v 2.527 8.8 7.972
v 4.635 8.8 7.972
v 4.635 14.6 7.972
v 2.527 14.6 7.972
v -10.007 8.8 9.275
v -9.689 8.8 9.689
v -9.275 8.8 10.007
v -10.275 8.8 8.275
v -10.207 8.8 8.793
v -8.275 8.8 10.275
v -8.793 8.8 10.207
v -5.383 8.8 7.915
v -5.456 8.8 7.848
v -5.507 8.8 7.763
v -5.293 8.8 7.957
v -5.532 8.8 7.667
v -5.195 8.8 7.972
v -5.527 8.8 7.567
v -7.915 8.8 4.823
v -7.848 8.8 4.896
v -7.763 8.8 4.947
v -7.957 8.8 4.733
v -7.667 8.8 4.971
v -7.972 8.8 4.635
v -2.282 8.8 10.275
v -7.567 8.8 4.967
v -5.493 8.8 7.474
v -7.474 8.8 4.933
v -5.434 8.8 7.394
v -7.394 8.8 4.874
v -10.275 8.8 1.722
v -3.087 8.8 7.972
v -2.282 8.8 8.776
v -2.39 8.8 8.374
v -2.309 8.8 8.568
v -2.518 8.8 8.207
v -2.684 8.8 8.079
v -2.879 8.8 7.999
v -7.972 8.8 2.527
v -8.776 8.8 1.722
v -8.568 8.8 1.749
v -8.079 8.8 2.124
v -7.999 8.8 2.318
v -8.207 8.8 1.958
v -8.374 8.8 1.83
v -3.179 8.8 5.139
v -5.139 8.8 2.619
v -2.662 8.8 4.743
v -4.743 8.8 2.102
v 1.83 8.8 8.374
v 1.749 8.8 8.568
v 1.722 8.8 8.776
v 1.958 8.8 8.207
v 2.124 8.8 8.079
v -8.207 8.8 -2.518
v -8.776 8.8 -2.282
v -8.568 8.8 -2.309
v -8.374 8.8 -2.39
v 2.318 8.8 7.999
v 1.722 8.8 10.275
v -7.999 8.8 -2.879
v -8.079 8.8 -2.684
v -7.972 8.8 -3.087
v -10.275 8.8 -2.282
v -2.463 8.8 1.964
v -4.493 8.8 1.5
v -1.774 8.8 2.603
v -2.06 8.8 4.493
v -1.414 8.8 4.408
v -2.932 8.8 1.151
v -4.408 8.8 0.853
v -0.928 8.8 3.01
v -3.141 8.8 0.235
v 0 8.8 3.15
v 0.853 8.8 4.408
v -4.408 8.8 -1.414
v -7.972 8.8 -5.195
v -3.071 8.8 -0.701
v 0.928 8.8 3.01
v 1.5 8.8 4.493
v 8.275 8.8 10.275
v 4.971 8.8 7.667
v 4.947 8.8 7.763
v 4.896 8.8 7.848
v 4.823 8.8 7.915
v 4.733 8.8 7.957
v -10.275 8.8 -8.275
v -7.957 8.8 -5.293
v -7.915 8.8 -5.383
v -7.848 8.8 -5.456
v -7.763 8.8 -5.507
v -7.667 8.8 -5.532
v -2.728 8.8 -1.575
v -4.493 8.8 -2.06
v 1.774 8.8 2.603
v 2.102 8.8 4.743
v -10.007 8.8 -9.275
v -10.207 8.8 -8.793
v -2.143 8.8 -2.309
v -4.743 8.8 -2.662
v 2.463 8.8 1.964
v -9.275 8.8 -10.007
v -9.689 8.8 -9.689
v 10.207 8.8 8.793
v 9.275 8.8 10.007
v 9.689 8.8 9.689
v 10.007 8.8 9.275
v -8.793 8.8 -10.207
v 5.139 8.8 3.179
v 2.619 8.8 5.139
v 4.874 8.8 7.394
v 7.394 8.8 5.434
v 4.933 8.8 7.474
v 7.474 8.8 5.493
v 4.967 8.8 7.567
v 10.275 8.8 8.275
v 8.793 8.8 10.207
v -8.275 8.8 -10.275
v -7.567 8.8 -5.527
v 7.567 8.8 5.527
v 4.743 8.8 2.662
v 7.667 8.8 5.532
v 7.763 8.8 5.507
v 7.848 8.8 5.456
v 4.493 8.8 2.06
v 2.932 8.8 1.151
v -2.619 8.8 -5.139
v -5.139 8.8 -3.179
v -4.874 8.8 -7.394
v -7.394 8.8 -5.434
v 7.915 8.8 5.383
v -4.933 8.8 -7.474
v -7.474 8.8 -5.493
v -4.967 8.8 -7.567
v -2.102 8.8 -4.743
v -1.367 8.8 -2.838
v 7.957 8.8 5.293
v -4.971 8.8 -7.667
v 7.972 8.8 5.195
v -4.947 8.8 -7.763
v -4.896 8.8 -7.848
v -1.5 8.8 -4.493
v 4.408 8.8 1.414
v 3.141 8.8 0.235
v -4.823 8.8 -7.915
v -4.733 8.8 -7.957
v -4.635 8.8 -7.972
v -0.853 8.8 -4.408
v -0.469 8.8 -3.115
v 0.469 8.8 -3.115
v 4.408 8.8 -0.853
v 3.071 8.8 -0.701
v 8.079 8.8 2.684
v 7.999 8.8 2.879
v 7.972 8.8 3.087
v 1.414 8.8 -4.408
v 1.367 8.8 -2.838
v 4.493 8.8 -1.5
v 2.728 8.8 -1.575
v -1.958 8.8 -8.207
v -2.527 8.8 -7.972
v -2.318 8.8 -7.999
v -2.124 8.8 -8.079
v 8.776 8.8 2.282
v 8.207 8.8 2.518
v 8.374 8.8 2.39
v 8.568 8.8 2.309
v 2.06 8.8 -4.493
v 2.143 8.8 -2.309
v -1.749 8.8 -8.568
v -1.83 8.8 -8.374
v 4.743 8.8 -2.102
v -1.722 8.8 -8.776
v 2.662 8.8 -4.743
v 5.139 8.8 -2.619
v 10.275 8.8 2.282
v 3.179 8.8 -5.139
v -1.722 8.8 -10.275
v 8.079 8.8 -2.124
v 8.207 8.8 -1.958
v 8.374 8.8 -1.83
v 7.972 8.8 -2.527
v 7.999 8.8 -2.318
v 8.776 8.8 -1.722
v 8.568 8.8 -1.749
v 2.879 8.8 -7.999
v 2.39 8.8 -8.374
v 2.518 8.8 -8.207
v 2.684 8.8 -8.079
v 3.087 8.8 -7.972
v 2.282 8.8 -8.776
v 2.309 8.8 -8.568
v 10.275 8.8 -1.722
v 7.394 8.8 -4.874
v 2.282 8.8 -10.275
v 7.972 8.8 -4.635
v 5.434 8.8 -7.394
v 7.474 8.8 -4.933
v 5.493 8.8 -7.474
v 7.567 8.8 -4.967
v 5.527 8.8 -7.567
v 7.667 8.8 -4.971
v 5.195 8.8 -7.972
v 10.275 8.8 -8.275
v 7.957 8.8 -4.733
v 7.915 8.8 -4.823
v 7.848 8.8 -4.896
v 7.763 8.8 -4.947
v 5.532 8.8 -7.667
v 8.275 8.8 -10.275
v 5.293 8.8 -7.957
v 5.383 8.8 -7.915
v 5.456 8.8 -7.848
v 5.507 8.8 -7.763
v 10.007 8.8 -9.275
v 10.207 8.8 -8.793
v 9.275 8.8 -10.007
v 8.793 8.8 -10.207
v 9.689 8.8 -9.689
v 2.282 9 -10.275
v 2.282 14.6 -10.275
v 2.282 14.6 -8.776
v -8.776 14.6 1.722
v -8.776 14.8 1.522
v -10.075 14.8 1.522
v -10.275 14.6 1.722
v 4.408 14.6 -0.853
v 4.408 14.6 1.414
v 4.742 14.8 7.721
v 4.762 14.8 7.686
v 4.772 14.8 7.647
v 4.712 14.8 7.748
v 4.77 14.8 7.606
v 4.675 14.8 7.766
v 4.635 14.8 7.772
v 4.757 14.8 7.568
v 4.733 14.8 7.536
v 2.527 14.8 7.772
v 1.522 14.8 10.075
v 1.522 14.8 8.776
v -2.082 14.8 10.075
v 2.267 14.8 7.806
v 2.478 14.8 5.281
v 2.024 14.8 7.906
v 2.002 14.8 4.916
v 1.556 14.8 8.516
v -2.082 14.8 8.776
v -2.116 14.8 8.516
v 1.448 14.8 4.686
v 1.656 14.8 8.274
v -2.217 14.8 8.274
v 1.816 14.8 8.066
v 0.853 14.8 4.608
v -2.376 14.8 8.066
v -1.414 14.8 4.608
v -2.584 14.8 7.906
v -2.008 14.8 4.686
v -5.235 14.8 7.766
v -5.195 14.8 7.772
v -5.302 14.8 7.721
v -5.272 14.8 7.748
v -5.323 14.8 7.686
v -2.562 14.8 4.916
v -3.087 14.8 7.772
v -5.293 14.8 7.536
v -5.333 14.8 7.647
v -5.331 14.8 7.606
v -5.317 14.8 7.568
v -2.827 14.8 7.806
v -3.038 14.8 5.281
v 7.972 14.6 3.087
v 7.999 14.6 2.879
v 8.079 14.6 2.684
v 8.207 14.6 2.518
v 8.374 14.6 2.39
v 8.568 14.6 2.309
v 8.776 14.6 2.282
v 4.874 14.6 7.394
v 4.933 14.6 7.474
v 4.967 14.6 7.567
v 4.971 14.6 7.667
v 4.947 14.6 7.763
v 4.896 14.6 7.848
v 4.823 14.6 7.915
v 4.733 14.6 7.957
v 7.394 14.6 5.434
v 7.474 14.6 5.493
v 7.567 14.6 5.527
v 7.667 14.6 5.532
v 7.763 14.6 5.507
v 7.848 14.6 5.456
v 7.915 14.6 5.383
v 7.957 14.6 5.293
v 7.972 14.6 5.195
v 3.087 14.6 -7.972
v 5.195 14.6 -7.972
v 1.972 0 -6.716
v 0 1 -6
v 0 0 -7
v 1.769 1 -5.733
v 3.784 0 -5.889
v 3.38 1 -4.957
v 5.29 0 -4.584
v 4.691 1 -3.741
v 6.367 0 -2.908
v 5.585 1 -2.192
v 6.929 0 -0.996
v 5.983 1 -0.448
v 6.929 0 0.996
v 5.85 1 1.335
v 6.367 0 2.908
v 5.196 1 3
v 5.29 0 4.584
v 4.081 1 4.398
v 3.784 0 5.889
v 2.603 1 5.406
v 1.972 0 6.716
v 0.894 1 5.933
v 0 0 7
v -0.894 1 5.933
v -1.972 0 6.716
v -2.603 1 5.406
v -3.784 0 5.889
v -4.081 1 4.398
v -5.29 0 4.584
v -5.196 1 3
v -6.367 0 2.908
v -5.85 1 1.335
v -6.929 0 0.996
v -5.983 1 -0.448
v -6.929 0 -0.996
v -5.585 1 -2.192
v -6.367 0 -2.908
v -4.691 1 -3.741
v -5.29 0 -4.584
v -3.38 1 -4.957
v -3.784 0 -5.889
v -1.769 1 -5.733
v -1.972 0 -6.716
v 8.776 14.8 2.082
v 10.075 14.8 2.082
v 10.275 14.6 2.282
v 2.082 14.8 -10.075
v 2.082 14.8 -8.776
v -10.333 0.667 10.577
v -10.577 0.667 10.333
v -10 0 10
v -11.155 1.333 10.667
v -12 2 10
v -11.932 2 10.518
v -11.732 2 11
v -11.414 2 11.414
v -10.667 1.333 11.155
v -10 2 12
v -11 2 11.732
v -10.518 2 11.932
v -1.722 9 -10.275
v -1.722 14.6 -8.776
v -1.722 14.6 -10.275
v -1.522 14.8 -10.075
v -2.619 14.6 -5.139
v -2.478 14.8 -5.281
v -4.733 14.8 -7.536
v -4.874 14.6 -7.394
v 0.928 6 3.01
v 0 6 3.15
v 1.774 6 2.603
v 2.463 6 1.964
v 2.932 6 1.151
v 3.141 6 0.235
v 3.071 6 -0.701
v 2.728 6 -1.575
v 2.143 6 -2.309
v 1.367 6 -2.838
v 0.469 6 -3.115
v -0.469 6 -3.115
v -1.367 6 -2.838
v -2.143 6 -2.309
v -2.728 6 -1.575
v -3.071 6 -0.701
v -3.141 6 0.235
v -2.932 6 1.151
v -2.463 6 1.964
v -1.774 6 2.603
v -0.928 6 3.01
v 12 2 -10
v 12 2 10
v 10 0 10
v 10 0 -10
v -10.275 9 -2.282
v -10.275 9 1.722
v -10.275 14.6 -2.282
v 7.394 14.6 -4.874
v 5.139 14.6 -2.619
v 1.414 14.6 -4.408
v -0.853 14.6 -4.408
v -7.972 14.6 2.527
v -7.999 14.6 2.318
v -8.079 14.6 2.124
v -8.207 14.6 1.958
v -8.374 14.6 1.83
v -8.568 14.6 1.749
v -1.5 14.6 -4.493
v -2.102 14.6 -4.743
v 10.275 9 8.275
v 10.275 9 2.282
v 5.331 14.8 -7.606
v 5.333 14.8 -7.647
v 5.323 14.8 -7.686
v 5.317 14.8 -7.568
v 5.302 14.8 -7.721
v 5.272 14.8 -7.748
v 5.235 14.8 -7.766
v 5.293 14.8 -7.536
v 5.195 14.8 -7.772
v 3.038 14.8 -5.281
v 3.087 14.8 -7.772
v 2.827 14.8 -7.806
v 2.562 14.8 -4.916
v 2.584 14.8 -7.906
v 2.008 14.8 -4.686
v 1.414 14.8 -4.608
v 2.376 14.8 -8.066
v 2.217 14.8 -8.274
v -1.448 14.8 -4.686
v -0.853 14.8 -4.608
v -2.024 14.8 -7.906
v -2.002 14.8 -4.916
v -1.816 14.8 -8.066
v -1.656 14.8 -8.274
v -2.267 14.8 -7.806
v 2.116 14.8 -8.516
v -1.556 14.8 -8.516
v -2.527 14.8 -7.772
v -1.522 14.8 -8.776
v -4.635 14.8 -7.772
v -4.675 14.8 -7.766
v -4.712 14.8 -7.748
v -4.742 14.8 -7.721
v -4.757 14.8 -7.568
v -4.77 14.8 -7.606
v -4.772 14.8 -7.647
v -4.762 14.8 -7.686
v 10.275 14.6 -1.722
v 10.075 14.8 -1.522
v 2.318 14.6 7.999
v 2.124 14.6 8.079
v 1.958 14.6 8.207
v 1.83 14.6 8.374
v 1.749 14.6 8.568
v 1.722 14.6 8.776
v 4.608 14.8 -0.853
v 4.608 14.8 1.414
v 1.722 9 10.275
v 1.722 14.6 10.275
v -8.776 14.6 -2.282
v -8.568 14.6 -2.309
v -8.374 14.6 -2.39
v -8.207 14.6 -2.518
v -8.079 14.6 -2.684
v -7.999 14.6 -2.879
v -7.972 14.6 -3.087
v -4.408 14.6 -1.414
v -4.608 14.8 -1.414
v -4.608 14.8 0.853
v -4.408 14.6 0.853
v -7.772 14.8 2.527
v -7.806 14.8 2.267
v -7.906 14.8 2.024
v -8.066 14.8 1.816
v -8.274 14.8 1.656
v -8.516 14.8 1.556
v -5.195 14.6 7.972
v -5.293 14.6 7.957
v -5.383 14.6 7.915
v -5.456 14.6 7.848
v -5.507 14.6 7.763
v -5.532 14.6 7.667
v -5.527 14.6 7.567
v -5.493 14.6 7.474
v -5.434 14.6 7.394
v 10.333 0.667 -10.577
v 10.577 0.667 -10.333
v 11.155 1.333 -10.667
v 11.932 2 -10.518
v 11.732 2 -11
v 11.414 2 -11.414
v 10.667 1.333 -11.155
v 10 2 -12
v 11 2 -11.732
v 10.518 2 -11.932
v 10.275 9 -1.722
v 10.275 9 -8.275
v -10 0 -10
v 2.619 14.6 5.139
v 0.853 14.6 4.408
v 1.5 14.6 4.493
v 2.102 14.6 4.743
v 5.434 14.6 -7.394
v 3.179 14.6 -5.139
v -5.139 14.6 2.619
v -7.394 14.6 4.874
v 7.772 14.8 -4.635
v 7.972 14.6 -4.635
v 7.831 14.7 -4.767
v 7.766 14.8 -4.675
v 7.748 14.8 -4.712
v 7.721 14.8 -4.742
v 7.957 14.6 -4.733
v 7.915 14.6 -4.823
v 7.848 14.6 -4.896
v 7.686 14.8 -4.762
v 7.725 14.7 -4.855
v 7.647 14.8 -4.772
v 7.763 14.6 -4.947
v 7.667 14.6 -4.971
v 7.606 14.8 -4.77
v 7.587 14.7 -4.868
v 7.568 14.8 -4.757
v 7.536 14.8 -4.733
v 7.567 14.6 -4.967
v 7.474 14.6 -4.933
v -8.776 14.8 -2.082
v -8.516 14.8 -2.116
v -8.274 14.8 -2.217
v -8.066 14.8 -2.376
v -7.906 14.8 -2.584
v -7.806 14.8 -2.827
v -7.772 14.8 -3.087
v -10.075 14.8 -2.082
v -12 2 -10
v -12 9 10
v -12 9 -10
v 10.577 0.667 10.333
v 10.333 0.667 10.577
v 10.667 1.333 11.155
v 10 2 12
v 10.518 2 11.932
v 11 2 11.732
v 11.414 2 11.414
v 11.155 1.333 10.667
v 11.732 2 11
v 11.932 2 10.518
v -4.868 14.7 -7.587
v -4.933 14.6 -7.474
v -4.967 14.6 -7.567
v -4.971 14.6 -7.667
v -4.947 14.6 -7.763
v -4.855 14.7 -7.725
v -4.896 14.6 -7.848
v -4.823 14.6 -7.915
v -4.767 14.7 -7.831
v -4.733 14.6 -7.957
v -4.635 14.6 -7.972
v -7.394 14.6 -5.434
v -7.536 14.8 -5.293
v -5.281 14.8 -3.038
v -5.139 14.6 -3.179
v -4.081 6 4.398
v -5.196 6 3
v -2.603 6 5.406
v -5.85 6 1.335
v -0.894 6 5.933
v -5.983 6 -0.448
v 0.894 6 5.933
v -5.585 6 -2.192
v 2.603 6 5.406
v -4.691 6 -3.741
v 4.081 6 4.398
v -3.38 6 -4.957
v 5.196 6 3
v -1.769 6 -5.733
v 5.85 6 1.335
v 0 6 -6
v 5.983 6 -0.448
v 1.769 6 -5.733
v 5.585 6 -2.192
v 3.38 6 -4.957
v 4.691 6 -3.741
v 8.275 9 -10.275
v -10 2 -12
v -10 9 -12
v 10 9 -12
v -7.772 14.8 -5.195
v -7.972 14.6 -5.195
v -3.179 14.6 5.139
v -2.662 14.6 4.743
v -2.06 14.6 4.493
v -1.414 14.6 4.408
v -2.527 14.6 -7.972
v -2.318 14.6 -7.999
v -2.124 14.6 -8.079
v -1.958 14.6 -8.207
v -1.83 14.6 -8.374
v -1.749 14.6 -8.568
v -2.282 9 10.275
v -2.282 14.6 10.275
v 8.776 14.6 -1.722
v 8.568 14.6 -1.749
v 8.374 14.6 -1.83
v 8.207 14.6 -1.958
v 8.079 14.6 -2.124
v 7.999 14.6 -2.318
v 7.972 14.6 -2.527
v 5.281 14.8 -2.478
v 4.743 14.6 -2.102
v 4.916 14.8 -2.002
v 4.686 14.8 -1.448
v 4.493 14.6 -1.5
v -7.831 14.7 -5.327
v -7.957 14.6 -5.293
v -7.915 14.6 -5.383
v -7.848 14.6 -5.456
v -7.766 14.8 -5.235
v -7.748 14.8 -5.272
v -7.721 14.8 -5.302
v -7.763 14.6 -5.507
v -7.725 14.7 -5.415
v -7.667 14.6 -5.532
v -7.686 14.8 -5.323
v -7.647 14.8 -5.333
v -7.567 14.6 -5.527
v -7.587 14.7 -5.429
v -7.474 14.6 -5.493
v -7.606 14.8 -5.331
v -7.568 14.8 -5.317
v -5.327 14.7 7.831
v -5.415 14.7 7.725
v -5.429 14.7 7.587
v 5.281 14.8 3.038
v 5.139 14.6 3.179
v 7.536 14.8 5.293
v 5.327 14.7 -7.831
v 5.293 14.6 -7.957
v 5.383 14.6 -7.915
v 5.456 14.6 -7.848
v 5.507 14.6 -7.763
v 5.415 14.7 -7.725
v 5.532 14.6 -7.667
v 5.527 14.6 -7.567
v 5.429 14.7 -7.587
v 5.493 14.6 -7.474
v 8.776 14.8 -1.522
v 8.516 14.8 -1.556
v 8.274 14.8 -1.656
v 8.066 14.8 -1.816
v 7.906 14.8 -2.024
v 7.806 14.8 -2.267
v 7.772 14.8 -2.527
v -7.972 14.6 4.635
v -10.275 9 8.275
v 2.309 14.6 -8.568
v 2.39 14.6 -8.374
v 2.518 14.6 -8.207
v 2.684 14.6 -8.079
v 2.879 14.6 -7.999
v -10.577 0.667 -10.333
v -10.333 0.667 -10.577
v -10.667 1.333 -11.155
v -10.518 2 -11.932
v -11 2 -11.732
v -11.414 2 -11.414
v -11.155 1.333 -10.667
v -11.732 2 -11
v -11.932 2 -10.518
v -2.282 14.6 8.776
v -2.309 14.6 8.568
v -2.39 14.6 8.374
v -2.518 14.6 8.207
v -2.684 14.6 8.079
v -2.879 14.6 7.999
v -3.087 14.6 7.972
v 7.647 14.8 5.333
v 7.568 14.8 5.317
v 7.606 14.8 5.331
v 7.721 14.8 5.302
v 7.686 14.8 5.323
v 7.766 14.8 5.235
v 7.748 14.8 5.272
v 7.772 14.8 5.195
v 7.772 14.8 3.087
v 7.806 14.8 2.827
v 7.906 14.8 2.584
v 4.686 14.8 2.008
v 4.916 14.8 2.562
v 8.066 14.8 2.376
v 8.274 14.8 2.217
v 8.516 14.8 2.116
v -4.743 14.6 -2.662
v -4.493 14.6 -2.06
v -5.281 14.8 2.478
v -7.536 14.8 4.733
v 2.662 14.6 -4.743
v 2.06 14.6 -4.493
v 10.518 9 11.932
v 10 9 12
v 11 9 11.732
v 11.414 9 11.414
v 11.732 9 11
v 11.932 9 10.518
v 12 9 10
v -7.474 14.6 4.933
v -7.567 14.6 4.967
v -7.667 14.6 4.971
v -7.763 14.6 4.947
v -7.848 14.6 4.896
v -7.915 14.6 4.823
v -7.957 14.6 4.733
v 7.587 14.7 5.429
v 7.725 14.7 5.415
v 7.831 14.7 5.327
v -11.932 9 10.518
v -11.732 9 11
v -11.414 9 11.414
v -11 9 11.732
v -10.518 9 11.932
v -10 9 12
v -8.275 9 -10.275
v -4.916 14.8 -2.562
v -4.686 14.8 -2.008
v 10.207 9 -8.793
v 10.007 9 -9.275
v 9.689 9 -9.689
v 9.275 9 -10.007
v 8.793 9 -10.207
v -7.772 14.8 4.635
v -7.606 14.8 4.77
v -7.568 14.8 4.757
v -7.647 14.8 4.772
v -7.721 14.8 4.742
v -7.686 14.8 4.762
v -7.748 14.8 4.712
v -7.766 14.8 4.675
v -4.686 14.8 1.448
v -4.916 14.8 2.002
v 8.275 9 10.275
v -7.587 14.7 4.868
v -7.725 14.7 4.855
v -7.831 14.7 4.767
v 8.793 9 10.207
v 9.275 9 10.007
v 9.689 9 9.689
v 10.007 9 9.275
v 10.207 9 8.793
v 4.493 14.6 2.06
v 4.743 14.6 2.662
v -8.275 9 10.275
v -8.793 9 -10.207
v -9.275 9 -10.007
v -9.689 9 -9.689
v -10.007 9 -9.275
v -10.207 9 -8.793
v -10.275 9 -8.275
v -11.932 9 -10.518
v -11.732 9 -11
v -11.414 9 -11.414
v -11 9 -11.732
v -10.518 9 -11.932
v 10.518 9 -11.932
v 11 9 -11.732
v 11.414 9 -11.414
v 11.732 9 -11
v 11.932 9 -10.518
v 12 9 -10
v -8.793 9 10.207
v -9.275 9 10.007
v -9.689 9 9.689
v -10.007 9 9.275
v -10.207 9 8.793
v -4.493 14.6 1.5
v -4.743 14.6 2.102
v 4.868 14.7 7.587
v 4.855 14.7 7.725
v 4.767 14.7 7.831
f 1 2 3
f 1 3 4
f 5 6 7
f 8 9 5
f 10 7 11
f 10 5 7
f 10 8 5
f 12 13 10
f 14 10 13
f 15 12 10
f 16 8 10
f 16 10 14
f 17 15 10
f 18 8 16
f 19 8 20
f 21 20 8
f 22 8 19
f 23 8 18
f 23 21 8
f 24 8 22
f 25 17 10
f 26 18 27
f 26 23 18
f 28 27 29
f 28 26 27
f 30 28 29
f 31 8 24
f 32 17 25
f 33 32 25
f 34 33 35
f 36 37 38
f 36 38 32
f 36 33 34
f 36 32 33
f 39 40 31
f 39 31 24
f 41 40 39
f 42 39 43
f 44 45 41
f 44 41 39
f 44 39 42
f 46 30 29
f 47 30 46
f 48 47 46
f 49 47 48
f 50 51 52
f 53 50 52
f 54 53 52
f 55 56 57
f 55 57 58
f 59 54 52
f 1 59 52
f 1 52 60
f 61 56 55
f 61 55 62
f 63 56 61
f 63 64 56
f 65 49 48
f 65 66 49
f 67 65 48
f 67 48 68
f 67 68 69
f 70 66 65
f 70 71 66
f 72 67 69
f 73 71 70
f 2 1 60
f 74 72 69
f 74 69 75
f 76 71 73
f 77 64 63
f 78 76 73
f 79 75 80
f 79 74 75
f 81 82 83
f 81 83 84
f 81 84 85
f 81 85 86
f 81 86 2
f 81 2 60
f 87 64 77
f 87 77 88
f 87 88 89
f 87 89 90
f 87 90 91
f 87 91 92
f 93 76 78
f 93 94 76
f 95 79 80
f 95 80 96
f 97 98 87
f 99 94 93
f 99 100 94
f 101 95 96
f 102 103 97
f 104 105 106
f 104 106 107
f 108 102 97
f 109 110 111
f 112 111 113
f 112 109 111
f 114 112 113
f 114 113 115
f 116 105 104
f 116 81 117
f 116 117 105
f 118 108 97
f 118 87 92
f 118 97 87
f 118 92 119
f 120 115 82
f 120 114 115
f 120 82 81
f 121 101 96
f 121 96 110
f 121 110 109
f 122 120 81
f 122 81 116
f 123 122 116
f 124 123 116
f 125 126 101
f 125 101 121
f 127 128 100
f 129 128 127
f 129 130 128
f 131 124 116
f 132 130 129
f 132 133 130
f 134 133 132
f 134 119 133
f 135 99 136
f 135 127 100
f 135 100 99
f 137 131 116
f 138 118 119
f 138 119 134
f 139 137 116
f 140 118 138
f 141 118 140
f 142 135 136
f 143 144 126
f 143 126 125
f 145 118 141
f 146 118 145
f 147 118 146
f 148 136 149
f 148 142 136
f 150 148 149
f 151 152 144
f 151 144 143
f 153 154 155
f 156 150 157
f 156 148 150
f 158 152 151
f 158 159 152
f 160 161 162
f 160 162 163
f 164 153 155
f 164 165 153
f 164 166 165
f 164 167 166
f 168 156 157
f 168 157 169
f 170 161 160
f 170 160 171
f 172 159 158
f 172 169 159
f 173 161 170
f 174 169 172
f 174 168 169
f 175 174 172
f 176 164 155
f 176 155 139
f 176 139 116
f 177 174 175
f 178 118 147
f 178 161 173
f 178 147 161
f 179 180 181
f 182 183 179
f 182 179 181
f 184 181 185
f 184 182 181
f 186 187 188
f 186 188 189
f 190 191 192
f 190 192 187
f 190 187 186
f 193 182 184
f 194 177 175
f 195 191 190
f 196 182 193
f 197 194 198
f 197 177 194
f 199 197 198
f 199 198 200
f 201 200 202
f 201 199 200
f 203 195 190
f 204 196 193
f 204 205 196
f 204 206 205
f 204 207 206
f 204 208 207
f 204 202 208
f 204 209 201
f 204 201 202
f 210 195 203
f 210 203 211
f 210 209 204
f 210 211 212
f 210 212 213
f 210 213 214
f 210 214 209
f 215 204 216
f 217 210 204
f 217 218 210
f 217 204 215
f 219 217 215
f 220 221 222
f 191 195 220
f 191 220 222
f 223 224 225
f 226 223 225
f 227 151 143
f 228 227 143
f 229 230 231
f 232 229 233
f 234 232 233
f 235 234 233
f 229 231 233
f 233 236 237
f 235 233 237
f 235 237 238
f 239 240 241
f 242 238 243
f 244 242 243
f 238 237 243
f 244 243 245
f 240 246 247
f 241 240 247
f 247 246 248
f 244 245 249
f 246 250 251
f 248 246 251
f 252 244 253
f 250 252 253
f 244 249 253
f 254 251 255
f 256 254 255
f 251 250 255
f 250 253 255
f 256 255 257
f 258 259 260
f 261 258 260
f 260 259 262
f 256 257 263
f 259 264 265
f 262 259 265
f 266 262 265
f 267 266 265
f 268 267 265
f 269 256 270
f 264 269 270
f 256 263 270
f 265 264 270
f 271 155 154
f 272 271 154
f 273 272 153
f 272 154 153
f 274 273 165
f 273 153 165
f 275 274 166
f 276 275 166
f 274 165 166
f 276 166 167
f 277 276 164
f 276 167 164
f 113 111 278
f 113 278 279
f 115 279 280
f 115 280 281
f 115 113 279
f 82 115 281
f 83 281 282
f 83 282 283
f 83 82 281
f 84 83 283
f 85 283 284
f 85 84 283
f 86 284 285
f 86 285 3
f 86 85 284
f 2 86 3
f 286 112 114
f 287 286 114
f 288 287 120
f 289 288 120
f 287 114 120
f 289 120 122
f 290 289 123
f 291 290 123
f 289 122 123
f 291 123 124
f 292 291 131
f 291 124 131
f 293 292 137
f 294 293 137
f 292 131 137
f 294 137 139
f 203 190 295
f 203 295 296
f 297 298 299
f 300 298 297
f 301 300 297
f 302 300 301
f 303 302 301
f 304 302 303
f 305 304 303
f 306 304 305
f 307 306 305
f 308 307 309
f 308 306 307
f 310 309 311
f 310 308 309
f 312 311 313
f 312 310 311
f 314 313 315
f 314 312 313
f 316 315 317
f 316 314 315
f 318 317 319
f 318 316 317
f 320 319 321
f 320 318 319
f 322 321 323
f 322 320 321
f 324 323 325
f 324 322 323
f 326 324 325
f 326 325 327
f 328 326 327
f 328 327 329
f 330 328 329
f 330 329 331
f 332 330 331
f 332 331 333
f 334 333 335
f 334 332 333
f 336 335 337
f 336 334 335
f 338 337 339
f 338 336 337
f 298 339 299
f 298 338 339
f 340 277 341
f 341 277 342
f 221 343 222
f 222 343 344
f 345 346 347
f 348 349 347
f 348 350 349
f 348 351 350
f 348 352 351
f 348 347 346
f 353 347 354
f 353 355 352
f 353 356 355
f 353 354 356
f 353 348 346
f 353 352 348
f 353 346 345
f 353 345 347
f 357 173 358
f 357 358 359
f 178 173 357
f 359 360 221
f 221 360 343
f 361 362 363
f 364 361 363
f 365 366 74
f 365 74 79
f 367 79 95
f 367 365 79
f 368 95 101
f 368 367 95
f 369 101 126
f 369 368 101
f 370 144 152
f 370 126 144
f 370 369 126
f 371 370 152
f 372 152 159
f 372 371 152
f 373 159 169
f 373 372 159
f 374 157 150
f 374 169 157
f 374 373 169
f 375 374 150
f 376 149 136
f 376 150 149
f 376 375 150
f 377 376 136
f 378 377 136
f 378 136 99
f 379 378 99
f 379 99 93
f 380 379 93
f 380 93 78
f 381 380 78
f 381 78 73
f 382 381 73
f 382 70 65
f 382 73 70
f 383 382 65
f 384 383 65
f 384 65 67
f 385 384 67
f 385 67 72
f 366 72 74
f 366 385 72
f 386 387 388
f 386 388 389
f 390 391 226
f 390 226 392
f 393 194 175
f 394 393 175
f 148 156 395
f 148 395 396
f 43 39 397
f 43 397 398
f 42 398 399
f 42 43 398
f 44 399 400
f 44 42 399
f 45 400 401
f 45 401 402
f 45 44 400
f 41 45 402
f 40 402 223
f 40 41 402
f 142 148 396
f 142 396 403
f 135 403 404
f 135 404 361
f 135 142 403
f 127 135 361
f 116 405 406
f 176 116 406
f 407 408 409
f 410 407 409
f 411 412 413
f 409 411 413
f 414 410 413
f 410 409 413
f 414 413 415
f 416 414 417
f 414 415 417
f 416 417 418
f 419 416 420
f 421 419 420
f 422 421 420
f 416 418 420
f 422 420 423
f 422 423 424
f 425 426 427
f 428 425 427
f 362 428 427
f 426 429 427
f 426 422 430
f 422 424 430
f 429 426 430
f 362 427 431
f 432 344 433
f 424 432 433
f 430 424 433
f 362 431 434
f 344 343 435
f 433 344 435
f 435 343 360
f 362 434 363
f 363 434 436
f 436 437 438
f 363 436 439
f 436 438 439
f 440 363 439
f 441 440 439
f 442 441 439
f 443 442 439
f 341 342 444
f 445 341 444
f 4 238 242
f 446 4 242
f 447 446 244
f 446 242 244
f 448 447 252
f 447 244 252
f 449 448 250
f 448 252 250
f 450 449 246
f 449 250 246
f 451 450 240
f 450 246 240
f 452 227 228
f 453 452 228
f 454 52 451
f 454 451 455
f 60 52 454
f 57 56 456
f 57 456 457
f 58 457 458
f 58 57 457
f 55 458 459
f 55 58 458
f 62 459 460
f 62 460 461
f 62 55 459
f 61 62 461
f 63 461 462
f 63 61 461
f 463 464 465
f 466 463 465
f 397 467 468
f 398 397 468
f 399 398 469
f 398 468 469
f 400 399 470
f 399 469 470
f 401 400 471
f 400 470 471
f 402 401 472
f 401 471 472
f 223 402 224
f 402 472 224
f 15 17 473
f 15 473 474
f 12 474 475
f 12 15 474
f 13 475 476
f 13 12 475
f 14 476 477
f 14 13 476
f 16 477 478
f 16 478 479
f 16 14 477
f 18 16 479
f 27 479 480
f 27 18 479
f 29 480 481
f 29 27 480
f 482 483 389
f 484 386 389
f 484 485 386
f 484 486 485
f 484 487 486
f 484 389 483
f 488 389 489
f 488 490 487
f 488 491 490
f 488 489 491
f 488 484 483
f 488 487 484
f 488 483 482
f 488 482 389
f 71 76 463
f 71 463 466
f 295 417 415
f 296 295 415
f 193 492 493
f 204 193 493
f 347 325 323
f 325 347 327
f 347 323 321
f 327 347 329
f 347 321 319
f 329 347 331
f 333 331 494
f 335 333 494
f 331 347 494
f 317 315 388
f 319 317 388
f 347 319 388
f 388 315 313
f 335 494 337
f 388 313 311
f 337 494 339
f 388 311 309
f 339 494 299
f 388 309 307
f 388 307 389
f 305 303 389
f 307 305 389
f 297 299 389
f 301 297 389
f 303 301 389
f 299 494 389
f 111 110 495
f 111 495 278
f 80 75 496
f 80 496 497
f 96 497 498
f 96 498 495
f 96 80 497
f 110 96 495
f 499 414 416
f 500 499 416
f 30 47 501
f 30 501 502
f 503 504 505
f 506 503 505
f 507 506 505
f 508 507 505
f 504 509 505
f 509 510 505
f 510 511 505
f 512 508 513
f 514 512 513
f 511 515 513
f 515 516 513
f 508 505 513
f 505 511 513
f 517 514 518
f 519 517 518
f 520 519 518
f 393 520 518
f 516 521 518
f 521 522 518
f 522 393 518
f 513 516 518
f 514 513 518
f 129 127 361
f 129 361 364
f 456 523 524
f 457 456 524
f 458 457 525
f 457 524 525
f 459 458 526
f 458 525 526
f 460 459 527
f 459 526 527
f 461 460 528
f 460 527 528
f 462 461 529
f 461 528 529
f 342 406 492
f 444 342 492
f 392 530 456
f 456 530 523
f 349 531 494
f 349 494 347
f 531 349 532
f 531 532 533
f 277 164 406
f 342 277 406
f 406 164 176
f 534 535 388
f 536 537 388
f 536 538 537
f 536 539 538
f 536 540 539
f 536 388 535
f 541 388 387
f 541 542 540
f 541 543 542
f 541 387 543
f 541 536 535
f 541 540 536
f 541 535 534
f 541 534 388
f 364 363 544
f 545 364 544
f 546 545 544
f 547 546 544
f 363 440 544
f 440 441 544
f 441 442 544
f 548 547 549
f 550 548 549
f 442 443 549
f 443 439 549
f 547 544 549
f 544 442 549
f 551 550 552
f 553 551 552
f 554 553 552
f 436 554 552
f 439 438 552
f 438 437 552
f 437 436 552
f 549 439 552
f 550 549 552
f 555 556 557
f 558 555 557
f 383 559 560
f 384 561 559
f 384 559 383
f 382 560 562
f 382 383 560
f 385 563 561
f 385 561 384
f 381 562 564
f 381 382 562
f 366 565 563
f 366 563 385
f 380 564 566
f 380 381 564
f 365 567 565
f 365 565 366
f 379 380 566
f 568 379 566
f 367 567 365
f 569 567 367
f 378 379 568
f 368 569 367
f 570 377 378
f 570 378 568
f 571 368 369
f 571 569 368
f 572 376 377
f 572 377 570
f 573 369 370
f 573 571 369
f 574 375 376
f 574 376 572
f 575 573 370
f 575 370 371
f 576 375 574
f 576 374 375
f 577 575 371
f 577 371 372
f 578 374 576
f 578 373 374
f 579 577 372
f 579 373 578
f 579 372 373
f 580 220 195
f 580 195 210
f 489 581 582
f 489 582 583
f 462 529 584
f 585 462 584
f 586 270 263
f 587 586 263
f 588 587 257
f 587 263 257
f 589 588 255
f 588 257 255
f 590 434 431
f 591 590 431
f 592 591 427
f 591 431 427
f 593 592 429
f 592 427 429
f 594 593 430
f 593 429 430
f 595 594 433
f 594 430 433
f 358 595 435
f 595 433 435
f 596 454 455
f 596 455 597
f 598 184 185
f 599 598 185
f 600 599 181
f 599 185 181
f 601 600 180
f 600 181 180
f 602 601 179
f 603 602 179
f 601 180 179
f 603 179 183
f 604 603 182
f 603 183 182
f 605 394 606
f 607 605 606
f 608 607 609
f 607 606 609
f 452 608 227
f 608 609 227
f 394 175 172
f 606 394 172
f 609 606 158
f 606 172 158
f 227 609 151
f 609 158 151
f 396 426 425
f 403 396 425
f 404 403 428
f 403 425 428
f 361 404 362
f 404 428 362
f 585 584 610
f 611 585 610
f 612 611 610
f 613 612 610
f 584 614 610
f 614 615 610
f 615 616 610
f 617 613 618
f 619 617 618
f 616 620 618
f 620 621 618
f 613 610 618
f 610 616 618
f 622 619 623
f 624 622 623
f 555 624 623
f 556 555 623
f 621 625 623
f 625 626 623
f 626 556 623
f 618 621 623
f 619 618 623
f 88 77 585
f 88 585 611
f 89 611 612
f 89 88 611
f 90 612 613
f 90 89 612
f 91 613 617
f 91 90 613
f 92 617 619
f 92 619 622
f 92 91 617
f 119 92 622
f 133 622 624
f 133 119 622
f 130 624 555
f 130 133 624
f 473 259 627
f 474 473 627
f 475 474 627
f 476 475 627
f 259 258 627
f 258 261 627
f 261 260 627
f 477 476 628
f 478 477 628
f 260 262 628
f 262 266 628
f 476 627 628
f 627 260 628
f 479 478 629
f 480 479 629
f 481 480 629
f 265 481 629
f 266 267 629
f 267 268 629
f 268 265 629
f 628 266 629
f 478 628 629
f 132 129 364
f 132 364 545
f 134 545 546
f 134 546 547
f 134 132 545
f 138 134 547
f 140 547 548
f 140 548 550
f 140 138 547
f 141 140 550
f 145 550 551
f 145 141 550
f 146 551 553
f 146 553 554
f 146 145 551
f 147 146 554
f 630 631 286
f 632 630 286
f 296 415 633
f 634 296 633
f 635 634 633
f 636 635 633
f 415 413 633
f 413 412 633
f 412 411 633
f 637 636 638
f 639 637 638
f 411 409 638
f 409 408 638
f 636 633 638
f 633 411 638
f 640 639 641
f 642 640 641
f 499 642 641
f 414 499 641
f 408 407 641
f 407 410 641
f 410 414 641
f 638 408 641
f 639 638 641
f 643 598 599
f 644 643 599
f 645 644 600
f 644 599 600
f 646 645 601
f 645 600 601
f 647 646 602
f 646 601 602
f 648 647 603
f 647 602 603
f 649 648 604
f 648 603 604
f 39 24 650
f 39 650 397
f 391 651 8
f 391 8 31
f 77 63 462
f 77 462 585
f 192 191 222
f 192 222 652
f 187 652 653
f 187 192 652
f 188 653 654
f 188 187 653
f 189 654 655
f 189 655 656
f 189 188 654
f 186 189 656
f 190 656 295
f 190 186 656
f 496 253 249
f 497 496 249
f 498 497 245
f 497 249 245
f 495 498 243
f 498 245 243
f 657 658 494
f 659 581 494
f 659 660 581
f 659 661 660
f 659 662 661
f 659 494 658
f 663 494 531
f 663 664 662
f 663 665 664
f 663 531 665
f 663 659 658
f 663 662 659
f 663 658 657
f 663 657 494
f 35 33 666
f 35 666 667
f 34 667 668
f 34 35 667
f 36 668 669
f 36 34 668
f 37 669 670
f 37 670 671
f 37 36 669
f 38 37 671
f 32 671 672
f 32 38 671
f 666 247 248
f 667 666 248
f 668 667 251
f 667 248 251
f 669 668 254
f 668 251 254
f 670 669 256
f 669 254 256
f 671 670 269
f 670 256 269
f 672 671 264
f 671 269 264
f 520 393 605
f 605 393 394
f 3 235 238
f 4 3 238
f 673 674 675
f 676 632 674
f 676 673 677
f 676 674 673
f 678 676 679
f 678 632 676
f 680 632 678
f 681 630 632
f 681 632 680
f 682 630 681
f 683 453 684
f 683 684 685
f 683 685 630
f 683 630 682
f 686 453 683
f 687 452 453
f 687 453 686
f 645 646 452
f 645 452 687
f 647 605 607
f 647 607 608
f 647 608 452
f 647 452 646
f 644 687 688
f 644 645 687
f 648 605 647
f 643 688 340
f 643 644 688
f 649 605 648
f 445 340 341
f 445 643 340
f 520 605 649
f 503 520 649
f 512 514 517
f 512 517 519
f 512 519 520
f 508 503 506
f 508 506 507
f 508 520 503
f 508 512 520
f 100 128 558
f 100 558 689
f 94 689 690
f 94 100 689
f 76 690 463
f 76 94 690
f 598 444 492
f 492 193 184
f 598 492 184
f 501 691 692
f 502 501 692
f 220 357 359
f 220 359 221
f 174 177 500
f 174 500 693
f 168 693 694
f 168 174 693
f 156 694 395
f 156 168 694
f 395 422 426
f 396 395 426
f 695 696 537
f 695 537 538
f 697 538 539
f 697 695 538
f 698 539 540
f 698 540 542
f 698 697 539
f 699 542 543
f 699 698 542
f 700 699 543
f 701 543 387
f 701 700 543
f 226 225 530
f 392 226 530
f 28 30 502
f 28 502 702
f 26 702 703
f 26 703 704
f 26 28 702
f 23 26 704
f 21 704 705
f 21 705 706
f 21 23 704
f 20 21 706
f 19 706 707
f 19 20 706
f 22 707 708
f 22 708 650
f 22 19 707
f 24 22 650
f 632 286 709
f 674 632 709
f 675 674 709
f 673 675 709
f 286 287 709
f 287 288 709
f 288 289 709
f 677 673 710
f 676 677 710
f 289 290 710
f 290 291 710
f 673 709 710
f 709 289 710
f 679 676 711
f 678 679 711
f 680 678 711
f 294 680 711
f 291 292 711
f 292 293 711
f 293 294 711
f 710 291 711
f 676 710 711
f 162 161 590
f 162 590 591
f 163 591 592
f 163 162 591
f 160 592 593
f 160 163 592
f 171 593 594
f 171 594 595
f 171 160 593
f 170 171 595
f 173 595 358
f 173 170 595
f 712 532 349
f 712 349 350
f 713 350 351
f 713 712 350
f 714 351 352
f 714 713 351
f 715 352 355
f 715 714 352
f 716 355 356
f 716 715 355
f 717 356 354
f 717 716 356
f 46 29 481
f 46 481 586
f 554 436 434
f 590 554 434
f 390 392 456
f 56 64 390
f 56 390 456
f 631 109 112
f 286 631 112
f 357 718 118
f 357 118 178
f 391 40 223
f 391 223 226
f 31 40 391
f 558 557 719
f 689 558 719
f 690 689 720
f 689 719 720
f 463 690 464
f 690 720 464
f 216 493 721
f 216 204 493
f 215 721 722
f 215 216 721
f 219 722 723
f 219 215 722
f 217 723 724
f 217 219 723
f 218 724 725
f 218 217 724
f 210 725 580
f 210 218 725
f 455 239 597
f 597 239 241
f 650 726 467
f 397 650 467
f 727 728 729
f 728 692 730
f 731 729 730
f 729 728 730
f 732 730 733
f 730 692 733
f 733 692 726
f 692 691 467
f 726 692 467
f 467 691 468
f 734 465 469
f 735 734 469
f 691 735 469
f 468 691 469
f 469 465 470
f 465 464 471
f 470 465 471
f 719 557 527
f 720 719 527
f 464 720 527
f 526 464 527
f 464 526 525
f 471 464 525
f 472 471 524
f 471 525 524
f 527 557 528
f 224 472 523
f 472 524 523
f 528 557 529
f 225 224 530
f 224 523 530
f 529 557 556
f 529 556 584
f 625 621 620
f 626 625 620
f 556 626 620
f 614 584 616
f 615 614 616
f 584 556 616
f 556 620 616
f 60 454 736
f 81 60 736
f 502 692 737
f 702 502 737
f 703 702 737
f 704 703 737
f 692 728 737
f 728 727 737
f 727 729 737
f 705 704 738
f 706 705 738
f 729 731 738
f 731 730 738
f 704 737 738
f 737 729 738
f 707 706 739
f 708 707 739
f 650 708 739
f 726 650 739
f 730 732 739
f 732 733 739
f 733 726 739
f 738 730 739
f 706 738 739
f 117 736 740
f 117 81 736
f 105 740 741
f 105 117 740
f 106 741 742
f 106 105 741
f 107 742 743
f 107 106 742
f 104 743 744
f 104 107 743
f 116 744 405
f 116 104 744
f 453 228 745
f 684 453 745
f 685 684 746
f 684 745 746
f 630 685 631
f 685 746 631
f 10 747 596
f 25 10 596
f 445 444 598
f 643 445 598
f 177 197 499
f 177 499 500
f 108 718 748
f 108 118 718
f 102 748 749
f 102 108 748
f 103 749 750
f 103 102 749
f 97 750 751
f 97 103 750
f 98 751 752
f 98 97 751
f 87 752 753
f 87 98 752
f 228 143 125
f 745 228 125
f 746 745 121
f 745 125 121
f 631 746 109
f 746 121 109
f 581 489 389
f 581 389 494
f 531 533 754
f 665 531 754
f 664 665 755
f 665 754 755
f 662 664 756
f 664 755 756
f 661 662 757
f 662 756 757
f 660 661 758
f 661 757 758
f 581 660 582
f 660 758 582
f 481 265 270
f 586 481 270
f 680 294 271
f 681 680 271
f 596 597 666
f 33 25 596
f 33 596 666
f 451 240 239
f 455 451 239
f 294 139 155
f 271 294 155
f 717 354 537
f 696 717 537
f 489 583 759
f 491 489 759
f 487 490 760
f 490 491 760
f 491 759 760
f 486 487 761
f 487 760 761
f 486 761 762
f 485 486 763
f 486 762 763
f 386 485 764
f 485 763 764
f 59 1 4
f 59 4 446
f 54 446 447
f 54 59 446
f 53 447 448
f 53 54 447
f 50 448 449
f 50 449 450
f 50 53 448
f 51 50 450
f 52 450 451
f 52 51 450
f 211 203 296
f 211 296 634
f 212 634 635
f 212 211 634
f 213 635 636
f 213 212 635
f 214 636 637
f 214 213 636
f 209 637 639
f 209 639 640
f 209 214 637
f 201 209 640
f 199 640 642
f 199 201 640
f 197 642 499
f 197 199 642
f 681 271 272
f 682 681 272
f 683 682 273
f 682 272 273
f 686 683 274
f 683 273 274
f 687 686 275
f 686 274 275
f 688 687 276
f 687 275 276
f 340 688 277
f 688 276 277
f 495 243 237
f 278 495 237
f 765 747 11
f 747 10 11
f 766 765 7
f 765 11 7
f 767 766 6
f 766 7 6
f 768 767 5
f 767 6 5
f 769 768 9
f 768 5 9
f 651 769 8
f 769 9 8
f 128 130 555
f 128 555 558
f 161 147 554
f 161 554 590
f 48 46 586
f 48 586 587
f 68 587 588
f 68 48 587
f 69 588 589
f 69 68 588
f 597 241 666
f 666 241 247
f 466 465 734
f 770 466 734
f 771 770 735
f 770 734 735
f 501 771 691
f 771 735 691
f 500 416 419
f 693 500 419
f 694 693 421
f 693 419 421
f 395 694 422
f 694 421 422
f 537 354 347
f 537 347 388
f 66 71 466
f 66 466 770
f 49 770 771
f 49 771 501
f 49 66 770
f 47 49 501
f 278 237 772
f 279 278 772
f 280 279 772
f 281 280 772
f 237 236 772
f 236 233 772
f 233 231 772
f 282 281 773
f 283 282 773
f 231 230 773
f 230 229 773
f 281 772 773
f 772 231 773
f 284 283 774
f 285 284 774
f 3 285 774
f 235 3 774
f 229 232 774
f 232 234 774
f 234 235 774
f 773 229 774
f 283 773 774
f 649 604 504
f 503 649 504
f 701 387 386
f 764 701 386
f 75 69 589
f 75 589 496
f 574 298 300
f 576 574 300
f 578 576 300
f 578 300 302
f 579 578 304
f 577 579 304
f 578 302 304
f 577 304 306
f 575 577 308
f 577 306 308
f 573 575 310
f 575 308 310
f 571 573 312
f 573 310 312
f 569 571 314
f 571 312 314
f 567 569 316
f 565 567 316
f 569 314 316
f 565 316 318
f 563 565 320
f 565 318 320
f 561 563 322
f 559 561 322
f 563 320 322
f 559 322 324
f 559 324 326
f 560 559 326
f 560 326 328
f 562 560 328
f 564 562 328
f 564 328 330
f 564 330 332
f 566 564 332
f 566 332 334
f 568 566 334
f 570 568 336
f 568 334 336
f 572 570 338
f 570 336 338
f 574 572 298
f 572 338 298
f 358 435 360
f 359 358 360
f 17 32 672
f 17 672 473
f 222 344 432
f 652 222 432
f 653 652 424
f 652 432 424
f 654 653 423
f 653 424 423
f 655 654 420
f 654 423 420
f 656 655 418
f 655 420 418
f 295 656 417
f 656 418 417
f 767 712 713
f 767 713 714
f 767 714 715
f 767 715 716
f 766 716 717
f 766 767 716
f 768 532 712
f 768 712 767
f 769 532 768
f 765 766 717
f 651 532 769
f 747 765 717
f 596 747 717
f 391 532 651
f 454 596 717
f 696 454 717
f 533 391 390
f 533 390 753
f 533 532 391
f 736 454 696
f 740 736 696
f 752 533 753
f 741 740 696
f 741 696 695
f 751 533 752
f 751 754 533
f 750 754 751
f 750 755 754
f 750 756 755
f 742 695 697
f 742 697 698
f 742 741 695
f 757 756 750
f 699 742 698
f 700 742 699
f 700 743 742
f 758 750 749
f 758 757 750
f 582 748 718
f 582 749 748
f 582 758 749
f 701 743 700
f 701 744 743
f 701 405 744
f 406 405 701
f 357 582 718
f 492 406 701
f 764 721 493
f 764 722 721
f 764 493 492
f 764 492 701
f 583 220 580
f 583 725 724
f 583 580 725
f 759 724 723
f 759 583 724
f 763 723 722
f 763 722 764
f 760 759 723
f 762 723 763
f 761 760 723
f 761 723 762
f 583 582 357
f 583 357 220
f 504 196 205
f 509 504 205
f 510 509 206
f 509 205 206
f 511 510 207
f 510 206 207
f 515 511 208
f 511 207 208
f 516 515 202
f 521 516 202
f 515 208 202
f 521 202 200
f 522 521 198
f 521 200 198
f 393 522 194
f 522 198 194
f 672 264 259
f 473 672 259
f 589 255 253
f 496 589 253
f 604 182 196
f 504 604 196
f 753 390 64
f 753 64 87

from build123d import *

# Parameters (mm, degrees)
SKETCH1_W           = 24
SKETCH1_H           = 24
SKETCH1_R           = 3.15
BOSS_EXTRUDE1_DEPTH = 9
SKETCH2_W           = 20.55
SKETCH2_H           = 20.55
CUT_EXTRUDE1_DEPTH  = 0.2
SKETCH4_R           = 6
CUT_EXTRUDE2_DEPTH  = 6
FILLET1_R           = 2
CHAMFER1_SIZE       = 2
CHAMFER2_SIZE       = 1
BOSS_EXTRUDE2_DEPTH = 6
CHAMFER3_SIZE       = 0.2


with BuildPart() as part:
    # Sketch1 → Boss-Extrude1 (new body)
    with BuildSketch(Plane(origin=(0, 0, 0), x_dir=(1, 0, 0), z_dir=(0, 1, 0))):
        Rectangle(SKETCH1_W, SKETCH1_H)
        with Locations(Location((0, 0, 0), (0, 0, 270))):
            Circle(SKETCH1_R, mode=Mode.SUBTRACT)
    extrude(amount=BOSS_EXTRUDE1_DEPTH)

    # Sketch2 → Cut-Extrude1 (cut)
    with BuildSketch(Plane(origin=(0, 9, 0), x_dir=(1, 0, 0), z_dir=(0, 1, 0))):
        Rectangle(SKETCH2_W, SKETCH2_H)
    extrude(amount=-CUT_EXTRUDE1_DEPTH, mode=Mode.SUBTRACT)

    # Sketch4 → Cut-Extrude2 (cut)
    with BuildSketch(Plane.XZ):
        with Locations(Location((0, 0, 0), (0, 0, 270))):
            Circle(SKETCH4_R)
    extrude(amount=-CUT_EXTRUDE2_DEPTH, mode=Mode.SUBTRACT)

    # Fillet1
    fillet1_edges = [part.edges().sort_by_distance(p)[0] for p in [
        (-10.275, 8.9, 10.275),
        (-10.275, 8.9, -10.275),
        (10.275, 8.9, -10.275),
        (10.275, 8.9, 10.275),
        (-12, 4.5, -12),
        (12, 4.5, -12),
        (12, 4.5, 12),
        (-12, 4.5, 12),
    ]]
    fillet(fillet1_edges, radius=FILLET1_R)

    # Chamfer1
    chamfer1_edges = [part.edges().sort_by_distance(p)[0] for p in [
        (12, 0, 0),
        (-12, 0, 0),
        (0, 0, -12),
        (0, 0, 12),
        (11.414213562, 0, -11.414213562),
        (-11.414213562, 0, -11.414213562),
        (-11.414213562, 0, 11.414213562),
        (11.414213562, 0, 11.414213562),
    ]]
    chamfer(chamfer1_edges, length=CHAMFER1_SIZE - 0.0001)  # a hair under: the kernel refuses the full size

    # Chamfer2
    chamfer2_edges = [part.edges().sort_by_distance(p)[0] for p in [
        (0, 0, 6),
    ]]
    chamfer(chamfer2_edges, length=CHAMFER2_SIZE)

    # Sketch5 → Boss-Extrude2 (add)
    with BuildSketch(Plane(origin=(0, 8.8, 0), x_dir=(1, 0, 0), z_dir=(0, 1, 0))):
        with BuildLine():
            Line((7.9716, -5.195), (7.9716, -3.0868))
            ThreePointArc((7.9716, -3.0868), (8.207320463, -2.517720463), (8.7764, -2.282))
            Line((8.7764, -2.282), (10.275, -2.282))
            Line((10.275, -2.282), (10.275, 1.7218))
            Line((10.275, 1.7218), (8.7764, 1.7218))
            ThreePointArc((8.7764, 1.7218), (8.207320463, 1.957520463), (7.9716, 2.5266))
            Line((7.9716, 2.5266), (7.9716, 4.6348))
            ThreePointArc((7.9716, 4.6348), (7.762823537, 4.947256058), (7.394256487, 4.873943513))
            Line((7.394256487, 4.873943513), (5.139419138, 2.619106165))
            ThreePointArc((5.139419138, 2.619106165), (4.598094223, 1.808956178), (4.408006192, 0.853319111))
            Line((4.408006192, 0.853319111), (4.408006192, -1.413519111))
            ThreePointArc((4.408006192, -1.413519111), (4.598094223, -2.369156178), (5.139419138, -3.179306165))
            Line((5.139419138, -3.179306165), (7.394256487, -5.434143513))
            ThreePointArc((7.394256487, -5.434143513), (7.762823537, -5.507456058), (7.9716, -5.195))
        make_face()
        with BuildLine():
            Line((1.7218, -10.275), (-2.282, -10.275))
            Line((-2.282, -10.275), (-2.282, -8.7764))
            ThreePointArc((-2.282, -8.7764), (-2.517720463, -8.207320463), (-3.0868, -7.9716))
            Line((-3.0868, -7.9716), (-5.195, -7.9716))
            ThreePointArc((-5.195, -7.9716), (-5.507456058, -7.762823537), (-5.434143513, -7.394256487))
            Line((-5.434143513, -7.394256487), (-3.179306165, -5.139419138))
            ThreePointArc((-3.179306165, -5.139419138), (-2.369156178, -4.598094223), (-1.413519111, -4.408006192))
            Line((-1.413519111, -4.408006192), (0.853319111, -4.408006192))
            ThreePointArc((0.853319111, -4.408006192), (1.808956178, -4.598094223), (2.619106165, -5.139419138))
            Line((2.619106165, -5.139419138), (4.873943513, -7.394256487))
            ThreePointArc((4.873943513, -7.394256487), (4.947256058, -7.762823537), (4.6348, -7.9716))
            Line((4.6348, -7.9716), (2.5266, -7.9716))
            ThreePointArc((2.5266, -7.9716), (1.957520463, -8.207320463), (1.7218, -8.7764))
            Line((1.7218, -8.7764), (1.7218, -10.275))
        make_face()
        with BuildLine():
            Line((-10.275, -1.7218), (-10.275, 2.282))
            Line((-10.275, 2.282), (-8.7764, 2.282))
            ThreePointArc((-8.7764, 2.282), (-8.207320463, 2.517720463), (-7.9716, 3.0868))
            Line((-7.9716, 3.0868), (-7.9716, 5.195))
            ThreePointArc((-7.9716, 5.195), (-7.762823537, 5.507456058), (-7.394256487, 5.434143513))
            Line((-7.394256487, 5.434143513), (-5.139419138, 3.179306165))
            ThreePointArc((-5.139419138, 3.179306165), (-4.598094223, 2.369156178), (-4.408006192, 1.413519111))
            Line((-4.408006192, 1.413519111), (-4.408006192, -0.853319111))
            ThreePointArc((-4.408006192, -0.853319111), (-4.598094223, -1.808956178), (-5.139419138, -2.619106165))
            Line((-5.139419138, -2.619106165), (-7.394256487, -4.873943513))
            ThreePointArc((-7.394256487, -4.873943513), (-7.762823537, -4.947256058), (-7.9716, -4.6348))
            Line((-7.9716, -4.6348), (-7.9716, -2.5266))
            ThreePointArc((-7.9716, -2.5266), (-8.207320463, -1.957520463), (-8.7764, -1.7218))
            Line((-8.7764, -1.7218), (-10.275, -1.7218))
        make_face()
        with BuildLine():
            Line((-1.7218, 10.275), (2.282, 10.275))
            Line((2.282, 10.275), (2.282, 8.7764))
            ThreePointArc((2.282, 8.7764), (2.517720463, 8.207320463), (3.0868, 7.9716))
            Line((3.0868, 7.9716), (5.195, 7.9716))
            ThreePointArc((5.195, 7.9716), (5.507456058, 7.762823537), (5.434143513, 7.394256487))
            Line((5.434143513, 7.394256487), (3.179306165, 5.139419138))
            ThreePointArc((3.179306165, 5.139419138), (2.369156178, 4.598094223), (1.413519111, 4.408006192))
            Line((1.413519111, 4.408006192), (-0.853319111, 4.408006192))
            ThreePointArc((-0.853319111, 4.408006192), (-1.808956178, 4.598094223), (-2.619106165, 5.139419138))
            Line((-2.619106165, 5.139419138), (-4.873943513, 7.394256487))
            ThreePointArc((-4.873943513, 7.394256487), (-4.947256058, 7.762823537), (-4.6348, 7.9716))
            Line((-4.6348, 7.9716), (-2.5266, 7.9716))
            ThreePointArc((-2.5266, 7.9716), (-1.957520463, 8.207320463), (-1.7218, 8.7764))
            Line((-1.7218, 8.7764), (-1.7218, 10.275))
        make_face()
    extrude(amount=BOSS_EXTRUDE2_DEPTH)

    # Chamfer3
    chamfer3_edges = [part.edges().sort_by_distance(p)[0] for p in [
        (-1.957520463, 14.8, -8.207320463),
        (2.517720463, 14.8, -8.207320463),
        (-1.7218, 14.8, -9.5257),
        (-3.5807, 14.8, -7.9716),
        (-4.947256058, 14.8, -7.762823537),
        (-3.746524839, 14.8, -6.266837812),
        (-1.808956178, 14.8, -4.598094223),
        (0.2801, 14.8, -4.408006192),
        (2.369156178, 14.8, -4.598094223),
        (4.306724839, 14.8, -6.266837812),
        (5.507456058, 14.8, -7.762823537),
        (4.1409, 14.8, -7.9716),
        (2.282, 14.8, -9.5257),
        (0.2801, 14.8, -10.275),
        (-8.207320463, 14.8, 1.957520463),
        (-8.207320463, 14.8, -2.517720463),
        (-9.5257, 14.8, 1.7218),
        (-7.9716, 14.8, 3.5807),
        (-7.762823537, 14.8, 4.947256058),
        (-6.266837812, 14.8, 3.746524839),
        (-4.598094223, 14.8, 1.808956178),
        (-4.408006192, 14.8, -0.2801),
        (-4.598094223, 14.8, -2.369156178),
        (-6.266837812, 14.8, -4.306724839),
        (-7.762823537, 14.8, -5.507456058),
        (-7.9716, 14.8, -4.1409),
        (-9.5257, 14.8, -2.282),
        (-10.275, 14.8, -0.2801),
        (1.957520463, 14.8, 8.207320463),
        (-2.517720463, 14.8, 8.207320463),
        (1.7218, 14.8, 9.5257),
        (3.5807, 14.8, 7.9716),
        (4.947256058, 14.8, 7.762823537),
        (3.746524839, 14.8, 6.266837812),
        (1.808956178, 14.8, 4.598094223),
        (-0.2801, 14.8, 4.408006192),
        (-2.369156178, 14.8, 4.598094223),
        (-4.306724839, 14.8, 6.266837812),
        (-5.507456058, 14.8, 7.762823537),
        (-4.1409, 14.8, 7.9716),
        (-2.282, 14.8, 9.5257),
        (-0.2801, 14.8, 10.275),
        (8.207320463, 14.8, -1.957520463),
        (8.207320463, 14.8, 2.517720463),
        (9.5257, 14.8, -1.7218),
        (7.9716, 14.8, -3.5807),
        (7.762823537, 14.8, -4.947256058),
        (6.266837812, 14.8, -3.746524839),
        (4.598094223, 14.8, -1.808956178),
        (4.408006192, 14.8, 0.2801),
        (4.598094223, 14.8, 2.369156178),
        (6.266837812, 14.8, 4.306724839),
        (7.762823537, 14.8, 5.507456058),
        (7.9716, 14.8, 4.1409),
        (9.5257, 14.8, 2.282),
        (10.275, 14.8, 0.2801),
    ]]
    chamfer(chamfer3_edges, length=CHAMFER3_SIZE)


solid = part.part
